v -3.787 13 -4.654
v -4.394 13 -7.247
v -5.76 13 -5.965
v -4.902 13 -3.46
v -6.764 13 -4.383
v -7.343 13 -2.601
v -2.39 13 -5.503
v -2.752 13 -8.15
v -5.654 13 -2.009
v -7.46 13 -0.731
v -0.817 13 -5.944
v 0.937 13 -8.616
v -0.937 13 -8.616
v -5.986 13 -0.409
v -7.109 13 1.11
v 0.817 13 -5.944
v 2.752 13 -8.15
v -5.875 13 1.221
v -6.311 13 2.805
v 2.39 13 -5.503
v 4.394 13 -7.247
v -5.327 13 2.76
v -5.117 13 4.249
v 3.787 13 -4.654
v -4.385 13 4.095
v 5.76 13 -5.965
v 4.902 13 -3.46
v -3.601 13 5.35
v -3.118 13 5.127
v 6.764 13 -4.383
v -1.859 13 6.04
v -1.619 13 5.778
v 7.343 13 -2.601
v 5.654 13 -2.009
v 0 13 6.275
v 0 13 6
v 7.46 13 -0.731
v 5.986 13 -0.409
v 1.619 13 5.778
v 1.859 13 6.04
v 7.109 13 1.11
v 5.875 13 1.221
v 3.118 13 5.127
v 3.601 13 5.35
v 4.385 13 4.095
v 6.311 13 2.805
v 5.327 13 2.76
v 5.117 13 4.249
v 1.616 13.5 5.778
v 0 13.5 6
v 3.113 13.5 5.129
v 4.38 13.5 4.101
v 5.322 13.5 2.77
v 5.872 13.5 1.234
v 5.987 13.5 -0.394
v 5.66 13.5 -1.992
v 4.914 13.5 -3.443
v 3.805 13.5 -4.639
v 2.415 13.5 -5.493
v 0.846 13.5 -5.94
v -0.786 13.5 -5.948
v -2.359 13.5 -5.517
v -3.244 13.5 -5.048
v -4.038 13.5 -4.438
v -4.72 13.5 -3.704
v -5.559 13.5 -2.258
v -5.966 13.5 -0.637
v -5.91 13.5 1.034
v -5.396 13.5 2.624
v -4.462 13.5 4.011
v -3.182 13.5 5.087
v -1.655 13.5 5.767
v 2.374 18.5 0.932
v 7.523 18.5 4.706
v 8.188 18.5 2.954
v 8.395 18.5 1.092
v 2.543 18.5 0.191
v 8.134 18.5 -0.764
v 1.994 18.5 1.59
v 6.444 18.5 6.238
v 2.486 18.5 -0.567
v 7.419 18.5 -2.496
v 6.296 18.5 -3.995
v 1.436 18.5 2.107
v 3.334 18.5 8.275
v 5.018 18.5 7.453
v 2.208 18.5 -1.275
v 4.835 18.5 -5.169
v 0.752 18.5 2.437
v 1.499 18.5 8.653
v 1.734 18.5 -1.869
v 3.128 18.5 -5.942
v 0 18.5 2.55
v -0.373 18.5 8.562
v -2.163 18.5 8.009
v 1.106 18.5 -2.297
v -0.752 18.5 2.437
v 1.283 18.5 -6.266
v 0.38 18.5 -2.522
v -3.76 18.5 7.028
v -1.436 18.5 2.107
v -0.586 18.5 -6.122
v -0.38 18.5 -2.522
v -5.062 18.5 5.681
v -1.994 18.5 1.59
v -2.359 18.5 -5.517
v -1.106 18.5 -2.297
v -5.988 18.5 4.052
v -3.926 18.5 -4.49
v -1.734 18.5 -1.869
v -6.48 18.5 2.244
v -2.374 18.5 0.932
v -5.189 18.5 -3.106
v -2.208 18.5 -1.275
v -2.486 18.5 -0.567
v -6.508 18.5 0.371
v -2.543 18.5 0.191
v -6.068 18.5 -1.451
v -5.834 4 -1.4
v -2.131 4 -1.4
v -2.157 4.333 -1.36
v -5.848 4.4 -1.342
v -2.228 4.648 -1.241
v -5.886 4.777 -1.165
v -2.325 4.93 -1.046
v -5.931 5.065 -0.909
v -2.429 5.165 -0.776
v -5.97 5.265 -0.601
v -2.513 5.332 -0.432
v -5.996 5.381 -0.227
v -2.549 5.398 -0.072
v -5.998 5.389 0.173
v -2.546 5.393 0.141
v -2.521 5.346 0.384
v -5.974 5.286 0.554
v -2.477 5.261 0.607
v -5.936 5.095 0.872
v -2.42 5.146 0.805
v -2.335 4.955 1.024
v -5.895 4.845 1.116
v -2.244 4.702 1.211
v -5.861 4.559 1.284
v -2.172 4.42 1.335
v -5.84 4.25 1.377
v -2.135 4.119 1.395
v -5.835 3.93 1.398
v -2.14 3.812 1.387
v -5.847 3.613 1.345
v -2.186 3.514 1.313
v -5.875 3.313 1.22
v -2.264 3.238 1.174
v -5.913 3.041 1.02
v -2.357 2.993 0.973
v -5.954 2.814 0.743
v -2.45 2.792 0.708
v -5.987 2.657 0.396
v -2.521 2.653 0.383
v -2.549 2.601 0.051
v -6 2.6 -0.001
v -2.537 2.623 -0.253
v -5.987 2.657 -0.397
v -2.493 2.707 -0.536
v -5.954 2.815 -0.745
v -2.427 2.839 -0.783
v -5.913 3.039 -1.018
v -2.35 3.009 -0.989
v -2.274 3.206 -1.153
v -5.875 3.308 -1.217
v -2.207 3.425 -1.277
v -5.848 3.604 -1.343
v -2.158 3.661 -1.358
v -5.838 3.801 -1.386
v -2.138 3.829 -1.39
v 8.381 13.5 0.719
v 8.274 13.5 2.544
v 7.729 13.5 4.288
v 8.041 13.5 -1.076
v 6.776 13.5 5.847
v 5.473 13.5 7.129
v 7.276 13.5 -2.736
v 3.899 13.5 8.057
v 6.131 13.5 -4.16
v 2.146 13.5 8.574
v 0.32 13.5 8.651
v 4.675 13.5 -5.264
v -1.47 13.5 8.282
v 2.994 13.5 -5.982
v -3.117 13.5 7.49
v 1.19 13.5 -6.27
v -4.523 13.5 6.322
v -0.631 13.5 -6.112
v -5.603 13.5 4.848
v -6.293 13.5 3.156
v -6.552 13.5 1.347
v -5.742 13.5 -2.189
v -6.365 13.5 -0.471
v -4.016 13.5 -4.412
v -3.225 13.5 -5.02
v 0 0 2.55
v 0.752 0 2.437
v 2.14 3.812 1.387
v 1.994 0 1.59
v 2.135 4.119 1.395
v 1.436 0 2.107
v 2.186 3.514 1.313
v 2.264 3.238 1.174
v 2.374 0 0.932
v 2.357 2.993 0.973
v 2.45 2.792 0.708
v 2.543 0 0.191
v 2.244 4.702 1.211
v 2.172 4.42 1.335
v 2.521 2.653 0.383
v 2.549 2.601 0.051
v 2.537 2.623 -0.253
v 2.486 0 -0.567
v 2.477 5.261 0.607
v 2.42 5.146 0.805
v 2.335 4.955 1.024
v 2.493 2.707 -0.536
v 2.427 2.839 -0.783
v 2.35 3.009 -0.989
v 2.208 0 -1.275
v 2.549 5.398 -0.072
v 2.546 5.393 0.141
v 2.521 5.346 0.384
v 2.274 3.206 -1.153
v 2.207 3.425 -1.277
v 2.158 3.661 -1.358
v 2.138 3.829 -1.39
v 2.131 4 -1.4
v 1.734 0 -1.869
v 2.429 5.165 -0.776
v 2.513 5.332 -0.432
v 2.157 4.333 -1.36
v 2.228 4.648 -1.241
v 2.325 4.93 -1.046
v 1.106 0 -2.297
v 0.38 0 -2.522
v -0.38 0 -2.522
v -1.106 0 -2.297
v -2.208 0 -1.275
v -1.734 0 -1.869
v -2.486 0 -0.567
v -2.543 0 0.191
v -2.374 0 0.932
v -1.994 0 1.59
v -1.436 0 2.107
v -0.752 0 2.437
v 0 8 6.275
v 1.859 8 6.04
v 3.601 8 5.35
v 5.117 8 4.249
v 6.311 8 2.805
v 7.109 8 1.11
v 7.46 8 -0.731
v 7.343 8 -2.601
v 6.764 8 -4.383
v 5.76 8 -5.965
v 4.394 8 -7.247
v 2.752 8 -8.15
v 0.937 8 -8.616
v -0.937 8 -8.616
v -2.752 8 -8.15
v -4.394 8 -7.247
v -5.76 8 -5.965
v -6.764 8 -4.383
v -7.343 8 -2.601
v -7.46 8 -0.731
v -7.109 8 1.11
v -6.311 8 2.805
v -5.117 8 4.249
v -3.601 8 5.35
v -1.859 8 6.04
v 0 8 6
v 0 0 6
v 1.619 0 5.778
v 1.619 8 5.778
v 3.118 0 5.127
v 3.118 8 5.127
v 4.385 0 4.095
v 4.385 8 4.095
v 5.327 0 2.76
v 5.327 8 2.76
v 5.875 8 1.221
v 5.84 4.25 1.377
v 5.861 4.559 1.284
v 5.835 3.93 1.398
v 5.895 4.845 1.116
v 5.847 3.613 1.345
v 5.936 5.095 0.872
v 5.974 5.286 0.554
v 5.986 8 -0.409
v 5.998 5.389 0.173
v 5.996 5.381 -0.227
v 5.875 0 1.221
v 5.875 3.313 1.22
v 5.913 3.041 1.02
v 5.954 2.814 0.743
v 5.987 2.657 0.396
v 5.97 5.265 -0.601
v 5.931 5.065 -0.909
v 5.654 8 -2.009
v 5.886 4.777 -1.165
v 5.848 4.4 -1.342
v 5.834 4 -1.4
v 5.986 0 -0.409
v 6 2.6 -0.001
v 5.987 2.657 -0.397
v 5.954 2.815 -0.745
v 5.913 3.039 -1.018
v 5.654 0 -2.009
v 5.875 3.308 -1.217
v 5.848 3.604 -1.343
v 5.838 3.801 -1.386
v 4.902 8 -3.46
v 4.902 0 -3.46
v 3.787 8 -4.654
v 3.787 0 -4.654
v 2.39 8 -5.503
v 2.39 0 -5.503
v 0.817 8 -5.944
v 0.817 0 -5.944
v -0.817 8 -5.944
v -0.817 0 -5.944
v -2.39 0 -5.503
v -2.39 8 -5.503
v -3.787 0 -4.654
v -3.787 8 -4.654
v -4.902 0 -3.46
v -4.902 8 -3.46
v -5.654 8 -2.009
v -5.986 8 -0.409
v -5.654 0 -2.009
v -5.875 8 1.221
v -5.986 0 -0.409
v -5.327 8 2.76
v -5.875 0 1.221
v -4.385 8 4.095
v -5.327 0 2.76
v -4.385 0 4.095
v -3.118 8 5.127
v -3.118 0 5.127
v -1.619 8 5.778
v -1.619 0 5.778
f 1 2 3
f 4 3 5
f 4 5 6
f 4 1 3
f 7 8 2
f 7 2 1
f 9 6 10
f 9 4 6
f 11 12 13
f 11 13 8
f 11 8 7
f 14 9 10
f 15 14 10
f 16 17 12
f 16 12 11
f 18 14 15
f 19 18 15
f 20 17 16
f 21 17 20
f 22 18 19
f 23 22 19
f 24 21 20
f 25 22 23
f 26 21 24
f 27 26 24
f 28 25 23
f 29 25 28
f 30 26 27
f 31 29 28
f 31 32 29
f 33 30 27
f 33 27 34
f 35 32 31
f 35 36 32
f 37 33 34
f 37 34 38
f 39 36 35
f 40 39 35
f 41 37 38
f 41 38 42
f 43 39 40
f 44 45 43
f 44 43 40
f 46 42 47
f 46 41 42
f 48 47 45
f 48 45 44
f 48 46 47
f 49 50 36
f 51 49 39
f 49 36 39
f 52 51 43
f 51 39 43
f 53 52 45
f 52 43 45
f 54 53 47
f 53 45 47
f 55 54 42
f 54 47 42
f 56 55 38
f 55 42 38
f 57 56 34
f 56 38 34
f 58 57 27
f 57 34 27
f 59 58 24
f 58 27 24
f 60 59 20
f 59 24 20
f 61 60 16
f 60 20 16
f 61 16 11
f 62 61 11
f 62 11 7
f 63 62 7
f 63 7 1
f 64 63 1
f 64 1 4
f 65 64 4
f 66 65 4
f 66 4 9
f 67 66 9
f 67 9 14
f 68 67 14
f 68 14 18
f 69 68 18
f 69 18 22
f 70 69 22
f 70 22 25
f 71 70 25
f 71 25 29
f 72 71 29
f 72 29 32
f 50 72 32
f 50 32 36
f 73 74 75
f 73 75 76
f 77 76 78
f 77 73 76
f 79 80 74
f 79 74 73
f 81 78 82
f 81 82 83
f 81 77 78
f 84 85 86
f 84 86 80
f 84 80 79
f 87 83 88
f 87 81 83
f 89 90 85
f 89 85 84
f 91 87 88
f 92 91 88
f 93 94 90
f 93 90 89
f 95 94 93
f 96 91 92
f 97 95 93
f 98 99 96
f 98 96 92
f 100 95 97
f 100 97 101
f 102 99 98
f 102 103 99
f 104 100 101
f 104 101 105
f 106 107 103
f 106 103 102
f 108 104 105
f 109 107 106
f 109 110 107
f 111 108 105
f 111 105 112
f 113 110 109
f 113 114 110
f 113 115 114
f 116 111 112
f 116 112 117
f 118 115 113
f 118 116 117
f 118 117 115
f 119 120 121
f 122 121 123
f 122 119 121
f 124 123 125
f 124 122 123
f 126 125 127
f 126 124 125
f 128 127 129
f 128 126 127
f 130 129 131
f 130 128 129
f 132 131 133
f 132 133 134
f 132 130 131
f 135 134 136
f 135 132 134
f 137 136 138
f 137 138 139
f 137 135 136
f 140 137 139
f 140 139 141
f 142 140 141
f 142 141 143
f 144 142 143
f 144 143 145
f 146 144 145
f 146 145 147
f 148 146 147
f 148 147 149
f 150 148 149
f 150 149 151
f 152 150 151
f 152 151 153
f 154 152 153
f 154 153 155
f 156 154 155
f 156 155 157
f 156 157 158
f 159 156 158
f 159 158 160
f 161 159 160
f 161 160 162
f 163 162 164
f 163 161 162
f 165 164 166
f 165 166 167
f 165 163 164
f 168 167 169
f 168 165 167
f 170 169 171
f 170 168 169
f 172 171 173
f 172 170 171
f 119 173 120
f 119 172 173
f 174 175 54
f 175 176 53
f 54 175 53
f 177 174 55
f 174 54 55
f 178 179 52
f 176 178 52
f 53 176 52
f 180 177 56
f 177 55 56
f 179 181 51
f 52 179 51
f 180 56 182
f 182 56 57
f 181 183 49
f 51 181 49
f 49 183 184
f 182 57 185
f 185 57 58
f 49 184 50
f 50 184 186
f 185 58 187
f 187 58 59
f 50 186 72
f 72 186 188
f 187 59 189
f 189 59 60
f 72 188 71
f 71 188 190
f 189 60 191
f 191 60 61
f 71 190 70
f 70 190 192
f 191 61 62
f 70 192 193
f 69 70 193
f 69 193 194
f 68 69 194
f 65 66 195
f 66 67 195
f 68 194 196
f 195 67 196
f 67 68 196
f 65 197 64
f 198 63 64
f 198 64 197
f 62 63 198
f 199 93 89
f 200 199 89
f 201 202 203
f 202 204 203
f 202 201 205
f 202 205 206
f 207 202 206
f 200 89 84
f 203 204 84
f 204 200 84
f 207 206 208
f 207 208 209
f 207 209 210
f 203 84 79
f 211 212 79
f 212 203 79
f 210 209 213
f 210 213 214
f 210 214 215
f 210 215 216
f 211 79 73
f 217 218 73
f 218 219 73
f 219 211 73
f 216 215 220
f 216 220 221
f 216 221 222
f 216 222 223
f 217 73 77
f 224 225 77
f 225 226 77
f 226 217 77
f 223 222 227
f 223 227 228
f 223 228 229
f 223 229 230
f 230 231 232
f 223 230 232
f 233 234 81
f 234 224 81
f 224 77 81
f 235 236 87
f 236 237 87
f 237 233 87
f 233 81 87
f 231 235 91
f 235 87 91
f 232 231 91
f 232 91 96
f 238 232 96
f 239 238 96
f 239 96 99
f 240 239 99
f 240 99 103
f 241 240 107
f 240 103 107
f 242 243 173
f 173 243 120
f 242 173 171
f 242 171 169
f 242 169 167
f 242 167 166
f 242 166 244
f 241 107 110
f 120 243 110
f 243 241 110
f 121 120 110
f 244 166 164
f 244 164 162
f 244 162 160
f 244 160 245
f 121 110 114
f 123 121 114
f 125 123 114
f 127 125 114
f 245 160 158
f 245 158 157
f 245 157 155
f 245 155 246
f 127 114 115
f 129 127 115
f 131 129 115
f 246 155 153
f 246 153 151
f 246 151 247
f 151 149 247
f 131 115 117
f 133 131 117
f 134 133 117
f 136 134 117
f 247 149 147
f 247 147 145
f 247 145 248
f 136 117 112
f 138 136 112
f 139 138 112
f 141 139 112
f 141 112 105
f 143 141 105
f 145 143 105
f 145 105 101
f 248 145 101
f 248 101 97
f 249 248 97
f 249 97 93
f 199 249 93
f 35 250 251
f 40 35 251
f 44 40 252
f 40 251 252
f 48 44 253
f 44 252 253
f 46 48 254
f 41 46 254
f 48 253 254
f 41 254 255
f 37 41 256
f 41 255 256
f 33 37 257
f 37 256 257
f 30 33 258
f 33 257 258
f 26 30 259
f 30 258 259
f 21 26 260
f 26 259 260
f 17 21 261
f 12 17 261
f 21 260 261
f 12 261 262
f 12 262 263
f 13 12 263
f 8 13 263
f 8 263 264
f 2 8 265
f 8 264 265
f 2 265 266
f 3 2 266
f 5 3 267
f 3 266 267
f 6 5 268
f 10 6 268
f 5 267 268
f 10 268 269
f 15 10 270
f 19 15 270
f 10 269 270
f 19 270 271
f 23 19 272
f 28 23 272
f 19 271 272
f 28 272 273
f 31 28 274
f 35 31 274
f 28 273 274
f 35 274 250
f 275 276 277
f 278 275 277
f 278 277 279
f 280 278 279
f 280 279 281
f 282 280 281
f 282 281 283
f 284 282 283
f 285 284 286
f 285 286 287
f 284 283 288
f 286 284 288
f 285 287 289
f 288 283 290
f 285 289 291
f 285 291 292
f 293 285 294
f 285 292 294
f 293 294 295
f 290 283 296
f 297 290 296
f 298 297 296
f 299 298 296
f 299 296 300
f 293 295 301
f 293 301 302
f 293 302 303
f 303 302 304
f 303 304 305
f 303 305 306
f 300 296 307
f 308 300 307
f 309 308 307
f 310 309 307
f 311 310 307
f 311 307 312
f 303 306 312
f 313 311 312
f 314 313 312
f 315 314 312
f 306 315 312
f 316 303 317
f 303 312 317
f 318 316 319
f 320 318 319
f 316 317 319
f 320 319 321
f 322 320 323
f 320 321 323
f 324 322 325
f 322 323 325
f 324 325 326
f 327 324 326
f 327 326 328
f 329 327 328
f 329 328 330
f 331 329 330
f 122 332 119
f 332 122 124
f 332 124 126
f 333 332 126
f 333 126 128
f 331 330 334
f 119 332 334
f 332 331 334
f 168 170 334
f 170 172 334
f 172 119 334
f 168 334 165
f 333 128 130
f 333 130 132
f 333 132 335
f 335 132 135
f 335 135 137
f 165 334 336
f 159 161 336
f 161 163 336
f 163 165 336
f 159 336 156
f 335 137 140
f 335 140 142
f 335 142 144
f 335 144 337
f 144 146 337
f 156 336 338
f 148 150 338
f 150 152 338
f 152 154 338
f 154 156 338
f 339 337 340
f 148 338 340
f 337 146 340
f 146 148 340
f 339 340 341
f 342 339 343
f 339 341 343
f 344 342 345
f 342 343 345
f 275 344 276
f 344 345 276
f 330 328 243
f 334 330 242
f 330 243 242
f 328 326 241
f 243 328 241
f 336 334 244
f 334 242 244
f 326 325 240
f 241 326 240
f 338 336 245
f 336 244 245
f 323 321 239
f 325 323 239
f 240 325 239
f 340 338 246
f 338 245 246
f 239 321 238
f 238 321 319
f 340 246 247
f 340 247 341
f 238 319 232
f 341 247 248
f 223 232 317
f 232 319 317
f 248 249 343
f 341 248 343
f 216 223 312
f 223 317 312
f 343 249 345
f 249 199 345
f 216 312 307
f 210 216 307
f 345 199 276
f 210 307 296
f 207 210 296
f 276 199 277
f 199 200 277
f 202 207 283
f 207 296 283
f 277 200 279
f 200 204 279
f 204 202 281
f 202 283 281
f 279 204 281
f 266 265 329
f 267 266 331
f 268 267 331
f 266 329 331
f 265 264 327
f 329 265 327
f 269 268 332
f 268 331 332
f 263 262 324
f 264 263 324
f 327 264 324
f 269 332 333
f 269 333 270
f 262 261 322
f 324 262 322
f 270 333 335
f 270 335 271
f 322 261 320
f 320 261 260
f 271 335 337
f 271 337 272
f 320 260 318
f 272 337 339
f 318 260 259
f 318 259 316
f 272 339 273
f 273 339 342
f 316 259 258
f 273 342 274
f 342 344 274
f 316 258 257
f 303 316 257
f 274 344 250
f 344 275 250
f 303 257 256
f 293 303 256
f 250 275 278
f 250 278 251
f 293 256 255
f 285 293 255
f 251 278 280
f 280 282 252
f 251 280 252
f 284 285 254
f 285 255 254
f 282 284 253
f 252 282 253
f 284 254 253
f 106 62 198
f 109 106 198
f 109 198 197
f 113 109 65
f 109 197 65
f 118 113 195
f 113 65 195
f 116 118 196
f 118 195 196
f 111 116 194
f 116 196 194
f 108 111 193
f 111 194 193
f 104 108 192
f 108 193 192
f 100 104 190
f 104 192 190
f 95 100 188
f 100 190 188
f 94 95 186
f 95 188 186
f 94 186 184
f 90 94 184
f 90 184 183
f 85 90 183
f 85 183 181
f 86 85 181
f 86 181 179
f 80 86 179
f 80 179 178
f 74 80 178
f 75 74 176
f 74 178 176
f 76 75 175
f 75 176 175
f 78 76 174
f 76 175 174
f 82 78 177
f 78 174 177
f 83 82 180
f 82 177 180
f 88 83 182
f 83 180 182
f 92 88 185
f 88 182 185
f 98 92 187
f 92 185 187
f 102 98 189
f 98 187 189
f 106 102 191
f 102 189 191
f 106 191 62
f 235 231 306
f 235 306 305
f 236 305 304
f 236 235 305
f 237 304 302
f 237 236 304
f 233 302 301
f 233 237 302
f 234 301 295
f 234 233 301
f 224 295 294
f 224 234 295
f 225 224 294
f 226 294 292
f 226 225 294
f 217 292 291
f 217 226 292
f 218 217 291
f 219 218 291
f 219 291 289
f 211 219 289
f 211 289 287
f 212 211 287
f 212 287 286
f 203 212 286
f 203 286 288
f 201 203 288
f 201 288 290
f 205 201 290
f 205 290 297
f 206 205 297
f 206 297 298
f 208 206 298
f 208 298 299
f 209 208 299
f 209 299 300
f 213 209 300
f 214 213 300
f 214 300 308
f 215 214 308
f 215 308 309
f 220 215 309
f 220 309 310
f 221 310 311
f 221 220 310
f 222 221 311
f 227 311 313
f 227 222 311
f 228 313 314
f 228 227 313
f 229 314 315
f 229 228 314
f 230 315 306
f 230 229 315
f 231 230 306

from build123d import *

# Parameters (mm, degrees)
SKETCH2_R              = 6
BASE_DEPTH             = 8
SKETCH3_R              = 7.475
CAM_A_DEPTH            = 5
SKETCH4_R              = 6
SPACER_DEPTH           = 0.5
SKETCH5_R              = 7.475
CAM_B_DEPTH            = 5
SKETCH6_R              = 2.55
SHAFT_HOLE_DEPTH       = 23.0907904
SCREW_HOLES_DEPTH      = 23.0907904
SCREW_HOLES_DEPTH_BACK = 23.0907904
SKETCH7_R              = 1.4


with BuildPart() as part:
    # Sketch2 → Base (new body)
    with BuildSketch(Plane(origin=(0, 0, 0), x_dir=(1, 0, 0), z_dir=(0, 1, 0))):
        with Locations(Location((0, 0, 0), (0, 0, 270))):
            Circle(SKETCH2_R)
    extrude(amount=BASE_DEPTH)

    # Sketch3 → Cam A (add)
    with BuildSketch(Plane(origin=(0, 8, 0), x_dir=(1, 0, 0), z_dir=(0, 1, 0))):
        with Locations(Location((0, 1.2, 0), (0, 0, 270))):
            Circle(SKETCH3_R)
    extrude(amount=CAM_A_DEPTH)

    # Sketch4 → Spacer (add)
    with BuildSketch(Plane(origin=(0, 13, 0), x_dir=(1, 0, 0), z_dir=(0, 1, 0))):
        with Locations(Location((0, 0, 0), (0, 0, 270))):
            Circle(SKETCH4_R)
    extrude(amount=SPACER_DEPTH)

    # Sketch5 → Cam B (add)
    with BuildSketch(Plane(origin=(0, 13.5, 0), x_dir=(1, 0, 0), z_dir=(0, 1, 0))):
        with Locations(Location((0.921272716, -1.2, 0), (0, 0, 116.029296009))):
            Circle(SKETCH5_R)
    extrude(amount=CAM_B_DEPTH)

    # Sketch6 → Shaft Hole (cut, through all)
    with BuildSketch(Plane(origin=(0, 18.5, 0), x_dir=(1, 0, 0), z_dir=(0, 1, 0))):
        with Locations(Location((0, 0, 0), (0, 0, 270))):
            Circle(SKETCH6_R)
    extrude(amount=-SHAFT_HOLE_DEPTH, mode=Mode.SUBTRACT)

    # Sketch7 → Screw Holes (cut, two sides: drawn at the far end of the back side and taken through both)
    with BuildSketch(Plane(origin=(0, 0, 0), x_dir=(0, 0, -1), z_dir=(1, 0, 0)).offset(-SCREW_HOLES_DEPTH_BACK)):
        with Locations((0, 4)):
            Circle(SKETCH7_R)
    extrude(amount=SCREW_HOLES_DEPTH + SCREW_HOLES_DEPTH_BACK, mode=Mode.SUBTRACT)


solid = part.part
